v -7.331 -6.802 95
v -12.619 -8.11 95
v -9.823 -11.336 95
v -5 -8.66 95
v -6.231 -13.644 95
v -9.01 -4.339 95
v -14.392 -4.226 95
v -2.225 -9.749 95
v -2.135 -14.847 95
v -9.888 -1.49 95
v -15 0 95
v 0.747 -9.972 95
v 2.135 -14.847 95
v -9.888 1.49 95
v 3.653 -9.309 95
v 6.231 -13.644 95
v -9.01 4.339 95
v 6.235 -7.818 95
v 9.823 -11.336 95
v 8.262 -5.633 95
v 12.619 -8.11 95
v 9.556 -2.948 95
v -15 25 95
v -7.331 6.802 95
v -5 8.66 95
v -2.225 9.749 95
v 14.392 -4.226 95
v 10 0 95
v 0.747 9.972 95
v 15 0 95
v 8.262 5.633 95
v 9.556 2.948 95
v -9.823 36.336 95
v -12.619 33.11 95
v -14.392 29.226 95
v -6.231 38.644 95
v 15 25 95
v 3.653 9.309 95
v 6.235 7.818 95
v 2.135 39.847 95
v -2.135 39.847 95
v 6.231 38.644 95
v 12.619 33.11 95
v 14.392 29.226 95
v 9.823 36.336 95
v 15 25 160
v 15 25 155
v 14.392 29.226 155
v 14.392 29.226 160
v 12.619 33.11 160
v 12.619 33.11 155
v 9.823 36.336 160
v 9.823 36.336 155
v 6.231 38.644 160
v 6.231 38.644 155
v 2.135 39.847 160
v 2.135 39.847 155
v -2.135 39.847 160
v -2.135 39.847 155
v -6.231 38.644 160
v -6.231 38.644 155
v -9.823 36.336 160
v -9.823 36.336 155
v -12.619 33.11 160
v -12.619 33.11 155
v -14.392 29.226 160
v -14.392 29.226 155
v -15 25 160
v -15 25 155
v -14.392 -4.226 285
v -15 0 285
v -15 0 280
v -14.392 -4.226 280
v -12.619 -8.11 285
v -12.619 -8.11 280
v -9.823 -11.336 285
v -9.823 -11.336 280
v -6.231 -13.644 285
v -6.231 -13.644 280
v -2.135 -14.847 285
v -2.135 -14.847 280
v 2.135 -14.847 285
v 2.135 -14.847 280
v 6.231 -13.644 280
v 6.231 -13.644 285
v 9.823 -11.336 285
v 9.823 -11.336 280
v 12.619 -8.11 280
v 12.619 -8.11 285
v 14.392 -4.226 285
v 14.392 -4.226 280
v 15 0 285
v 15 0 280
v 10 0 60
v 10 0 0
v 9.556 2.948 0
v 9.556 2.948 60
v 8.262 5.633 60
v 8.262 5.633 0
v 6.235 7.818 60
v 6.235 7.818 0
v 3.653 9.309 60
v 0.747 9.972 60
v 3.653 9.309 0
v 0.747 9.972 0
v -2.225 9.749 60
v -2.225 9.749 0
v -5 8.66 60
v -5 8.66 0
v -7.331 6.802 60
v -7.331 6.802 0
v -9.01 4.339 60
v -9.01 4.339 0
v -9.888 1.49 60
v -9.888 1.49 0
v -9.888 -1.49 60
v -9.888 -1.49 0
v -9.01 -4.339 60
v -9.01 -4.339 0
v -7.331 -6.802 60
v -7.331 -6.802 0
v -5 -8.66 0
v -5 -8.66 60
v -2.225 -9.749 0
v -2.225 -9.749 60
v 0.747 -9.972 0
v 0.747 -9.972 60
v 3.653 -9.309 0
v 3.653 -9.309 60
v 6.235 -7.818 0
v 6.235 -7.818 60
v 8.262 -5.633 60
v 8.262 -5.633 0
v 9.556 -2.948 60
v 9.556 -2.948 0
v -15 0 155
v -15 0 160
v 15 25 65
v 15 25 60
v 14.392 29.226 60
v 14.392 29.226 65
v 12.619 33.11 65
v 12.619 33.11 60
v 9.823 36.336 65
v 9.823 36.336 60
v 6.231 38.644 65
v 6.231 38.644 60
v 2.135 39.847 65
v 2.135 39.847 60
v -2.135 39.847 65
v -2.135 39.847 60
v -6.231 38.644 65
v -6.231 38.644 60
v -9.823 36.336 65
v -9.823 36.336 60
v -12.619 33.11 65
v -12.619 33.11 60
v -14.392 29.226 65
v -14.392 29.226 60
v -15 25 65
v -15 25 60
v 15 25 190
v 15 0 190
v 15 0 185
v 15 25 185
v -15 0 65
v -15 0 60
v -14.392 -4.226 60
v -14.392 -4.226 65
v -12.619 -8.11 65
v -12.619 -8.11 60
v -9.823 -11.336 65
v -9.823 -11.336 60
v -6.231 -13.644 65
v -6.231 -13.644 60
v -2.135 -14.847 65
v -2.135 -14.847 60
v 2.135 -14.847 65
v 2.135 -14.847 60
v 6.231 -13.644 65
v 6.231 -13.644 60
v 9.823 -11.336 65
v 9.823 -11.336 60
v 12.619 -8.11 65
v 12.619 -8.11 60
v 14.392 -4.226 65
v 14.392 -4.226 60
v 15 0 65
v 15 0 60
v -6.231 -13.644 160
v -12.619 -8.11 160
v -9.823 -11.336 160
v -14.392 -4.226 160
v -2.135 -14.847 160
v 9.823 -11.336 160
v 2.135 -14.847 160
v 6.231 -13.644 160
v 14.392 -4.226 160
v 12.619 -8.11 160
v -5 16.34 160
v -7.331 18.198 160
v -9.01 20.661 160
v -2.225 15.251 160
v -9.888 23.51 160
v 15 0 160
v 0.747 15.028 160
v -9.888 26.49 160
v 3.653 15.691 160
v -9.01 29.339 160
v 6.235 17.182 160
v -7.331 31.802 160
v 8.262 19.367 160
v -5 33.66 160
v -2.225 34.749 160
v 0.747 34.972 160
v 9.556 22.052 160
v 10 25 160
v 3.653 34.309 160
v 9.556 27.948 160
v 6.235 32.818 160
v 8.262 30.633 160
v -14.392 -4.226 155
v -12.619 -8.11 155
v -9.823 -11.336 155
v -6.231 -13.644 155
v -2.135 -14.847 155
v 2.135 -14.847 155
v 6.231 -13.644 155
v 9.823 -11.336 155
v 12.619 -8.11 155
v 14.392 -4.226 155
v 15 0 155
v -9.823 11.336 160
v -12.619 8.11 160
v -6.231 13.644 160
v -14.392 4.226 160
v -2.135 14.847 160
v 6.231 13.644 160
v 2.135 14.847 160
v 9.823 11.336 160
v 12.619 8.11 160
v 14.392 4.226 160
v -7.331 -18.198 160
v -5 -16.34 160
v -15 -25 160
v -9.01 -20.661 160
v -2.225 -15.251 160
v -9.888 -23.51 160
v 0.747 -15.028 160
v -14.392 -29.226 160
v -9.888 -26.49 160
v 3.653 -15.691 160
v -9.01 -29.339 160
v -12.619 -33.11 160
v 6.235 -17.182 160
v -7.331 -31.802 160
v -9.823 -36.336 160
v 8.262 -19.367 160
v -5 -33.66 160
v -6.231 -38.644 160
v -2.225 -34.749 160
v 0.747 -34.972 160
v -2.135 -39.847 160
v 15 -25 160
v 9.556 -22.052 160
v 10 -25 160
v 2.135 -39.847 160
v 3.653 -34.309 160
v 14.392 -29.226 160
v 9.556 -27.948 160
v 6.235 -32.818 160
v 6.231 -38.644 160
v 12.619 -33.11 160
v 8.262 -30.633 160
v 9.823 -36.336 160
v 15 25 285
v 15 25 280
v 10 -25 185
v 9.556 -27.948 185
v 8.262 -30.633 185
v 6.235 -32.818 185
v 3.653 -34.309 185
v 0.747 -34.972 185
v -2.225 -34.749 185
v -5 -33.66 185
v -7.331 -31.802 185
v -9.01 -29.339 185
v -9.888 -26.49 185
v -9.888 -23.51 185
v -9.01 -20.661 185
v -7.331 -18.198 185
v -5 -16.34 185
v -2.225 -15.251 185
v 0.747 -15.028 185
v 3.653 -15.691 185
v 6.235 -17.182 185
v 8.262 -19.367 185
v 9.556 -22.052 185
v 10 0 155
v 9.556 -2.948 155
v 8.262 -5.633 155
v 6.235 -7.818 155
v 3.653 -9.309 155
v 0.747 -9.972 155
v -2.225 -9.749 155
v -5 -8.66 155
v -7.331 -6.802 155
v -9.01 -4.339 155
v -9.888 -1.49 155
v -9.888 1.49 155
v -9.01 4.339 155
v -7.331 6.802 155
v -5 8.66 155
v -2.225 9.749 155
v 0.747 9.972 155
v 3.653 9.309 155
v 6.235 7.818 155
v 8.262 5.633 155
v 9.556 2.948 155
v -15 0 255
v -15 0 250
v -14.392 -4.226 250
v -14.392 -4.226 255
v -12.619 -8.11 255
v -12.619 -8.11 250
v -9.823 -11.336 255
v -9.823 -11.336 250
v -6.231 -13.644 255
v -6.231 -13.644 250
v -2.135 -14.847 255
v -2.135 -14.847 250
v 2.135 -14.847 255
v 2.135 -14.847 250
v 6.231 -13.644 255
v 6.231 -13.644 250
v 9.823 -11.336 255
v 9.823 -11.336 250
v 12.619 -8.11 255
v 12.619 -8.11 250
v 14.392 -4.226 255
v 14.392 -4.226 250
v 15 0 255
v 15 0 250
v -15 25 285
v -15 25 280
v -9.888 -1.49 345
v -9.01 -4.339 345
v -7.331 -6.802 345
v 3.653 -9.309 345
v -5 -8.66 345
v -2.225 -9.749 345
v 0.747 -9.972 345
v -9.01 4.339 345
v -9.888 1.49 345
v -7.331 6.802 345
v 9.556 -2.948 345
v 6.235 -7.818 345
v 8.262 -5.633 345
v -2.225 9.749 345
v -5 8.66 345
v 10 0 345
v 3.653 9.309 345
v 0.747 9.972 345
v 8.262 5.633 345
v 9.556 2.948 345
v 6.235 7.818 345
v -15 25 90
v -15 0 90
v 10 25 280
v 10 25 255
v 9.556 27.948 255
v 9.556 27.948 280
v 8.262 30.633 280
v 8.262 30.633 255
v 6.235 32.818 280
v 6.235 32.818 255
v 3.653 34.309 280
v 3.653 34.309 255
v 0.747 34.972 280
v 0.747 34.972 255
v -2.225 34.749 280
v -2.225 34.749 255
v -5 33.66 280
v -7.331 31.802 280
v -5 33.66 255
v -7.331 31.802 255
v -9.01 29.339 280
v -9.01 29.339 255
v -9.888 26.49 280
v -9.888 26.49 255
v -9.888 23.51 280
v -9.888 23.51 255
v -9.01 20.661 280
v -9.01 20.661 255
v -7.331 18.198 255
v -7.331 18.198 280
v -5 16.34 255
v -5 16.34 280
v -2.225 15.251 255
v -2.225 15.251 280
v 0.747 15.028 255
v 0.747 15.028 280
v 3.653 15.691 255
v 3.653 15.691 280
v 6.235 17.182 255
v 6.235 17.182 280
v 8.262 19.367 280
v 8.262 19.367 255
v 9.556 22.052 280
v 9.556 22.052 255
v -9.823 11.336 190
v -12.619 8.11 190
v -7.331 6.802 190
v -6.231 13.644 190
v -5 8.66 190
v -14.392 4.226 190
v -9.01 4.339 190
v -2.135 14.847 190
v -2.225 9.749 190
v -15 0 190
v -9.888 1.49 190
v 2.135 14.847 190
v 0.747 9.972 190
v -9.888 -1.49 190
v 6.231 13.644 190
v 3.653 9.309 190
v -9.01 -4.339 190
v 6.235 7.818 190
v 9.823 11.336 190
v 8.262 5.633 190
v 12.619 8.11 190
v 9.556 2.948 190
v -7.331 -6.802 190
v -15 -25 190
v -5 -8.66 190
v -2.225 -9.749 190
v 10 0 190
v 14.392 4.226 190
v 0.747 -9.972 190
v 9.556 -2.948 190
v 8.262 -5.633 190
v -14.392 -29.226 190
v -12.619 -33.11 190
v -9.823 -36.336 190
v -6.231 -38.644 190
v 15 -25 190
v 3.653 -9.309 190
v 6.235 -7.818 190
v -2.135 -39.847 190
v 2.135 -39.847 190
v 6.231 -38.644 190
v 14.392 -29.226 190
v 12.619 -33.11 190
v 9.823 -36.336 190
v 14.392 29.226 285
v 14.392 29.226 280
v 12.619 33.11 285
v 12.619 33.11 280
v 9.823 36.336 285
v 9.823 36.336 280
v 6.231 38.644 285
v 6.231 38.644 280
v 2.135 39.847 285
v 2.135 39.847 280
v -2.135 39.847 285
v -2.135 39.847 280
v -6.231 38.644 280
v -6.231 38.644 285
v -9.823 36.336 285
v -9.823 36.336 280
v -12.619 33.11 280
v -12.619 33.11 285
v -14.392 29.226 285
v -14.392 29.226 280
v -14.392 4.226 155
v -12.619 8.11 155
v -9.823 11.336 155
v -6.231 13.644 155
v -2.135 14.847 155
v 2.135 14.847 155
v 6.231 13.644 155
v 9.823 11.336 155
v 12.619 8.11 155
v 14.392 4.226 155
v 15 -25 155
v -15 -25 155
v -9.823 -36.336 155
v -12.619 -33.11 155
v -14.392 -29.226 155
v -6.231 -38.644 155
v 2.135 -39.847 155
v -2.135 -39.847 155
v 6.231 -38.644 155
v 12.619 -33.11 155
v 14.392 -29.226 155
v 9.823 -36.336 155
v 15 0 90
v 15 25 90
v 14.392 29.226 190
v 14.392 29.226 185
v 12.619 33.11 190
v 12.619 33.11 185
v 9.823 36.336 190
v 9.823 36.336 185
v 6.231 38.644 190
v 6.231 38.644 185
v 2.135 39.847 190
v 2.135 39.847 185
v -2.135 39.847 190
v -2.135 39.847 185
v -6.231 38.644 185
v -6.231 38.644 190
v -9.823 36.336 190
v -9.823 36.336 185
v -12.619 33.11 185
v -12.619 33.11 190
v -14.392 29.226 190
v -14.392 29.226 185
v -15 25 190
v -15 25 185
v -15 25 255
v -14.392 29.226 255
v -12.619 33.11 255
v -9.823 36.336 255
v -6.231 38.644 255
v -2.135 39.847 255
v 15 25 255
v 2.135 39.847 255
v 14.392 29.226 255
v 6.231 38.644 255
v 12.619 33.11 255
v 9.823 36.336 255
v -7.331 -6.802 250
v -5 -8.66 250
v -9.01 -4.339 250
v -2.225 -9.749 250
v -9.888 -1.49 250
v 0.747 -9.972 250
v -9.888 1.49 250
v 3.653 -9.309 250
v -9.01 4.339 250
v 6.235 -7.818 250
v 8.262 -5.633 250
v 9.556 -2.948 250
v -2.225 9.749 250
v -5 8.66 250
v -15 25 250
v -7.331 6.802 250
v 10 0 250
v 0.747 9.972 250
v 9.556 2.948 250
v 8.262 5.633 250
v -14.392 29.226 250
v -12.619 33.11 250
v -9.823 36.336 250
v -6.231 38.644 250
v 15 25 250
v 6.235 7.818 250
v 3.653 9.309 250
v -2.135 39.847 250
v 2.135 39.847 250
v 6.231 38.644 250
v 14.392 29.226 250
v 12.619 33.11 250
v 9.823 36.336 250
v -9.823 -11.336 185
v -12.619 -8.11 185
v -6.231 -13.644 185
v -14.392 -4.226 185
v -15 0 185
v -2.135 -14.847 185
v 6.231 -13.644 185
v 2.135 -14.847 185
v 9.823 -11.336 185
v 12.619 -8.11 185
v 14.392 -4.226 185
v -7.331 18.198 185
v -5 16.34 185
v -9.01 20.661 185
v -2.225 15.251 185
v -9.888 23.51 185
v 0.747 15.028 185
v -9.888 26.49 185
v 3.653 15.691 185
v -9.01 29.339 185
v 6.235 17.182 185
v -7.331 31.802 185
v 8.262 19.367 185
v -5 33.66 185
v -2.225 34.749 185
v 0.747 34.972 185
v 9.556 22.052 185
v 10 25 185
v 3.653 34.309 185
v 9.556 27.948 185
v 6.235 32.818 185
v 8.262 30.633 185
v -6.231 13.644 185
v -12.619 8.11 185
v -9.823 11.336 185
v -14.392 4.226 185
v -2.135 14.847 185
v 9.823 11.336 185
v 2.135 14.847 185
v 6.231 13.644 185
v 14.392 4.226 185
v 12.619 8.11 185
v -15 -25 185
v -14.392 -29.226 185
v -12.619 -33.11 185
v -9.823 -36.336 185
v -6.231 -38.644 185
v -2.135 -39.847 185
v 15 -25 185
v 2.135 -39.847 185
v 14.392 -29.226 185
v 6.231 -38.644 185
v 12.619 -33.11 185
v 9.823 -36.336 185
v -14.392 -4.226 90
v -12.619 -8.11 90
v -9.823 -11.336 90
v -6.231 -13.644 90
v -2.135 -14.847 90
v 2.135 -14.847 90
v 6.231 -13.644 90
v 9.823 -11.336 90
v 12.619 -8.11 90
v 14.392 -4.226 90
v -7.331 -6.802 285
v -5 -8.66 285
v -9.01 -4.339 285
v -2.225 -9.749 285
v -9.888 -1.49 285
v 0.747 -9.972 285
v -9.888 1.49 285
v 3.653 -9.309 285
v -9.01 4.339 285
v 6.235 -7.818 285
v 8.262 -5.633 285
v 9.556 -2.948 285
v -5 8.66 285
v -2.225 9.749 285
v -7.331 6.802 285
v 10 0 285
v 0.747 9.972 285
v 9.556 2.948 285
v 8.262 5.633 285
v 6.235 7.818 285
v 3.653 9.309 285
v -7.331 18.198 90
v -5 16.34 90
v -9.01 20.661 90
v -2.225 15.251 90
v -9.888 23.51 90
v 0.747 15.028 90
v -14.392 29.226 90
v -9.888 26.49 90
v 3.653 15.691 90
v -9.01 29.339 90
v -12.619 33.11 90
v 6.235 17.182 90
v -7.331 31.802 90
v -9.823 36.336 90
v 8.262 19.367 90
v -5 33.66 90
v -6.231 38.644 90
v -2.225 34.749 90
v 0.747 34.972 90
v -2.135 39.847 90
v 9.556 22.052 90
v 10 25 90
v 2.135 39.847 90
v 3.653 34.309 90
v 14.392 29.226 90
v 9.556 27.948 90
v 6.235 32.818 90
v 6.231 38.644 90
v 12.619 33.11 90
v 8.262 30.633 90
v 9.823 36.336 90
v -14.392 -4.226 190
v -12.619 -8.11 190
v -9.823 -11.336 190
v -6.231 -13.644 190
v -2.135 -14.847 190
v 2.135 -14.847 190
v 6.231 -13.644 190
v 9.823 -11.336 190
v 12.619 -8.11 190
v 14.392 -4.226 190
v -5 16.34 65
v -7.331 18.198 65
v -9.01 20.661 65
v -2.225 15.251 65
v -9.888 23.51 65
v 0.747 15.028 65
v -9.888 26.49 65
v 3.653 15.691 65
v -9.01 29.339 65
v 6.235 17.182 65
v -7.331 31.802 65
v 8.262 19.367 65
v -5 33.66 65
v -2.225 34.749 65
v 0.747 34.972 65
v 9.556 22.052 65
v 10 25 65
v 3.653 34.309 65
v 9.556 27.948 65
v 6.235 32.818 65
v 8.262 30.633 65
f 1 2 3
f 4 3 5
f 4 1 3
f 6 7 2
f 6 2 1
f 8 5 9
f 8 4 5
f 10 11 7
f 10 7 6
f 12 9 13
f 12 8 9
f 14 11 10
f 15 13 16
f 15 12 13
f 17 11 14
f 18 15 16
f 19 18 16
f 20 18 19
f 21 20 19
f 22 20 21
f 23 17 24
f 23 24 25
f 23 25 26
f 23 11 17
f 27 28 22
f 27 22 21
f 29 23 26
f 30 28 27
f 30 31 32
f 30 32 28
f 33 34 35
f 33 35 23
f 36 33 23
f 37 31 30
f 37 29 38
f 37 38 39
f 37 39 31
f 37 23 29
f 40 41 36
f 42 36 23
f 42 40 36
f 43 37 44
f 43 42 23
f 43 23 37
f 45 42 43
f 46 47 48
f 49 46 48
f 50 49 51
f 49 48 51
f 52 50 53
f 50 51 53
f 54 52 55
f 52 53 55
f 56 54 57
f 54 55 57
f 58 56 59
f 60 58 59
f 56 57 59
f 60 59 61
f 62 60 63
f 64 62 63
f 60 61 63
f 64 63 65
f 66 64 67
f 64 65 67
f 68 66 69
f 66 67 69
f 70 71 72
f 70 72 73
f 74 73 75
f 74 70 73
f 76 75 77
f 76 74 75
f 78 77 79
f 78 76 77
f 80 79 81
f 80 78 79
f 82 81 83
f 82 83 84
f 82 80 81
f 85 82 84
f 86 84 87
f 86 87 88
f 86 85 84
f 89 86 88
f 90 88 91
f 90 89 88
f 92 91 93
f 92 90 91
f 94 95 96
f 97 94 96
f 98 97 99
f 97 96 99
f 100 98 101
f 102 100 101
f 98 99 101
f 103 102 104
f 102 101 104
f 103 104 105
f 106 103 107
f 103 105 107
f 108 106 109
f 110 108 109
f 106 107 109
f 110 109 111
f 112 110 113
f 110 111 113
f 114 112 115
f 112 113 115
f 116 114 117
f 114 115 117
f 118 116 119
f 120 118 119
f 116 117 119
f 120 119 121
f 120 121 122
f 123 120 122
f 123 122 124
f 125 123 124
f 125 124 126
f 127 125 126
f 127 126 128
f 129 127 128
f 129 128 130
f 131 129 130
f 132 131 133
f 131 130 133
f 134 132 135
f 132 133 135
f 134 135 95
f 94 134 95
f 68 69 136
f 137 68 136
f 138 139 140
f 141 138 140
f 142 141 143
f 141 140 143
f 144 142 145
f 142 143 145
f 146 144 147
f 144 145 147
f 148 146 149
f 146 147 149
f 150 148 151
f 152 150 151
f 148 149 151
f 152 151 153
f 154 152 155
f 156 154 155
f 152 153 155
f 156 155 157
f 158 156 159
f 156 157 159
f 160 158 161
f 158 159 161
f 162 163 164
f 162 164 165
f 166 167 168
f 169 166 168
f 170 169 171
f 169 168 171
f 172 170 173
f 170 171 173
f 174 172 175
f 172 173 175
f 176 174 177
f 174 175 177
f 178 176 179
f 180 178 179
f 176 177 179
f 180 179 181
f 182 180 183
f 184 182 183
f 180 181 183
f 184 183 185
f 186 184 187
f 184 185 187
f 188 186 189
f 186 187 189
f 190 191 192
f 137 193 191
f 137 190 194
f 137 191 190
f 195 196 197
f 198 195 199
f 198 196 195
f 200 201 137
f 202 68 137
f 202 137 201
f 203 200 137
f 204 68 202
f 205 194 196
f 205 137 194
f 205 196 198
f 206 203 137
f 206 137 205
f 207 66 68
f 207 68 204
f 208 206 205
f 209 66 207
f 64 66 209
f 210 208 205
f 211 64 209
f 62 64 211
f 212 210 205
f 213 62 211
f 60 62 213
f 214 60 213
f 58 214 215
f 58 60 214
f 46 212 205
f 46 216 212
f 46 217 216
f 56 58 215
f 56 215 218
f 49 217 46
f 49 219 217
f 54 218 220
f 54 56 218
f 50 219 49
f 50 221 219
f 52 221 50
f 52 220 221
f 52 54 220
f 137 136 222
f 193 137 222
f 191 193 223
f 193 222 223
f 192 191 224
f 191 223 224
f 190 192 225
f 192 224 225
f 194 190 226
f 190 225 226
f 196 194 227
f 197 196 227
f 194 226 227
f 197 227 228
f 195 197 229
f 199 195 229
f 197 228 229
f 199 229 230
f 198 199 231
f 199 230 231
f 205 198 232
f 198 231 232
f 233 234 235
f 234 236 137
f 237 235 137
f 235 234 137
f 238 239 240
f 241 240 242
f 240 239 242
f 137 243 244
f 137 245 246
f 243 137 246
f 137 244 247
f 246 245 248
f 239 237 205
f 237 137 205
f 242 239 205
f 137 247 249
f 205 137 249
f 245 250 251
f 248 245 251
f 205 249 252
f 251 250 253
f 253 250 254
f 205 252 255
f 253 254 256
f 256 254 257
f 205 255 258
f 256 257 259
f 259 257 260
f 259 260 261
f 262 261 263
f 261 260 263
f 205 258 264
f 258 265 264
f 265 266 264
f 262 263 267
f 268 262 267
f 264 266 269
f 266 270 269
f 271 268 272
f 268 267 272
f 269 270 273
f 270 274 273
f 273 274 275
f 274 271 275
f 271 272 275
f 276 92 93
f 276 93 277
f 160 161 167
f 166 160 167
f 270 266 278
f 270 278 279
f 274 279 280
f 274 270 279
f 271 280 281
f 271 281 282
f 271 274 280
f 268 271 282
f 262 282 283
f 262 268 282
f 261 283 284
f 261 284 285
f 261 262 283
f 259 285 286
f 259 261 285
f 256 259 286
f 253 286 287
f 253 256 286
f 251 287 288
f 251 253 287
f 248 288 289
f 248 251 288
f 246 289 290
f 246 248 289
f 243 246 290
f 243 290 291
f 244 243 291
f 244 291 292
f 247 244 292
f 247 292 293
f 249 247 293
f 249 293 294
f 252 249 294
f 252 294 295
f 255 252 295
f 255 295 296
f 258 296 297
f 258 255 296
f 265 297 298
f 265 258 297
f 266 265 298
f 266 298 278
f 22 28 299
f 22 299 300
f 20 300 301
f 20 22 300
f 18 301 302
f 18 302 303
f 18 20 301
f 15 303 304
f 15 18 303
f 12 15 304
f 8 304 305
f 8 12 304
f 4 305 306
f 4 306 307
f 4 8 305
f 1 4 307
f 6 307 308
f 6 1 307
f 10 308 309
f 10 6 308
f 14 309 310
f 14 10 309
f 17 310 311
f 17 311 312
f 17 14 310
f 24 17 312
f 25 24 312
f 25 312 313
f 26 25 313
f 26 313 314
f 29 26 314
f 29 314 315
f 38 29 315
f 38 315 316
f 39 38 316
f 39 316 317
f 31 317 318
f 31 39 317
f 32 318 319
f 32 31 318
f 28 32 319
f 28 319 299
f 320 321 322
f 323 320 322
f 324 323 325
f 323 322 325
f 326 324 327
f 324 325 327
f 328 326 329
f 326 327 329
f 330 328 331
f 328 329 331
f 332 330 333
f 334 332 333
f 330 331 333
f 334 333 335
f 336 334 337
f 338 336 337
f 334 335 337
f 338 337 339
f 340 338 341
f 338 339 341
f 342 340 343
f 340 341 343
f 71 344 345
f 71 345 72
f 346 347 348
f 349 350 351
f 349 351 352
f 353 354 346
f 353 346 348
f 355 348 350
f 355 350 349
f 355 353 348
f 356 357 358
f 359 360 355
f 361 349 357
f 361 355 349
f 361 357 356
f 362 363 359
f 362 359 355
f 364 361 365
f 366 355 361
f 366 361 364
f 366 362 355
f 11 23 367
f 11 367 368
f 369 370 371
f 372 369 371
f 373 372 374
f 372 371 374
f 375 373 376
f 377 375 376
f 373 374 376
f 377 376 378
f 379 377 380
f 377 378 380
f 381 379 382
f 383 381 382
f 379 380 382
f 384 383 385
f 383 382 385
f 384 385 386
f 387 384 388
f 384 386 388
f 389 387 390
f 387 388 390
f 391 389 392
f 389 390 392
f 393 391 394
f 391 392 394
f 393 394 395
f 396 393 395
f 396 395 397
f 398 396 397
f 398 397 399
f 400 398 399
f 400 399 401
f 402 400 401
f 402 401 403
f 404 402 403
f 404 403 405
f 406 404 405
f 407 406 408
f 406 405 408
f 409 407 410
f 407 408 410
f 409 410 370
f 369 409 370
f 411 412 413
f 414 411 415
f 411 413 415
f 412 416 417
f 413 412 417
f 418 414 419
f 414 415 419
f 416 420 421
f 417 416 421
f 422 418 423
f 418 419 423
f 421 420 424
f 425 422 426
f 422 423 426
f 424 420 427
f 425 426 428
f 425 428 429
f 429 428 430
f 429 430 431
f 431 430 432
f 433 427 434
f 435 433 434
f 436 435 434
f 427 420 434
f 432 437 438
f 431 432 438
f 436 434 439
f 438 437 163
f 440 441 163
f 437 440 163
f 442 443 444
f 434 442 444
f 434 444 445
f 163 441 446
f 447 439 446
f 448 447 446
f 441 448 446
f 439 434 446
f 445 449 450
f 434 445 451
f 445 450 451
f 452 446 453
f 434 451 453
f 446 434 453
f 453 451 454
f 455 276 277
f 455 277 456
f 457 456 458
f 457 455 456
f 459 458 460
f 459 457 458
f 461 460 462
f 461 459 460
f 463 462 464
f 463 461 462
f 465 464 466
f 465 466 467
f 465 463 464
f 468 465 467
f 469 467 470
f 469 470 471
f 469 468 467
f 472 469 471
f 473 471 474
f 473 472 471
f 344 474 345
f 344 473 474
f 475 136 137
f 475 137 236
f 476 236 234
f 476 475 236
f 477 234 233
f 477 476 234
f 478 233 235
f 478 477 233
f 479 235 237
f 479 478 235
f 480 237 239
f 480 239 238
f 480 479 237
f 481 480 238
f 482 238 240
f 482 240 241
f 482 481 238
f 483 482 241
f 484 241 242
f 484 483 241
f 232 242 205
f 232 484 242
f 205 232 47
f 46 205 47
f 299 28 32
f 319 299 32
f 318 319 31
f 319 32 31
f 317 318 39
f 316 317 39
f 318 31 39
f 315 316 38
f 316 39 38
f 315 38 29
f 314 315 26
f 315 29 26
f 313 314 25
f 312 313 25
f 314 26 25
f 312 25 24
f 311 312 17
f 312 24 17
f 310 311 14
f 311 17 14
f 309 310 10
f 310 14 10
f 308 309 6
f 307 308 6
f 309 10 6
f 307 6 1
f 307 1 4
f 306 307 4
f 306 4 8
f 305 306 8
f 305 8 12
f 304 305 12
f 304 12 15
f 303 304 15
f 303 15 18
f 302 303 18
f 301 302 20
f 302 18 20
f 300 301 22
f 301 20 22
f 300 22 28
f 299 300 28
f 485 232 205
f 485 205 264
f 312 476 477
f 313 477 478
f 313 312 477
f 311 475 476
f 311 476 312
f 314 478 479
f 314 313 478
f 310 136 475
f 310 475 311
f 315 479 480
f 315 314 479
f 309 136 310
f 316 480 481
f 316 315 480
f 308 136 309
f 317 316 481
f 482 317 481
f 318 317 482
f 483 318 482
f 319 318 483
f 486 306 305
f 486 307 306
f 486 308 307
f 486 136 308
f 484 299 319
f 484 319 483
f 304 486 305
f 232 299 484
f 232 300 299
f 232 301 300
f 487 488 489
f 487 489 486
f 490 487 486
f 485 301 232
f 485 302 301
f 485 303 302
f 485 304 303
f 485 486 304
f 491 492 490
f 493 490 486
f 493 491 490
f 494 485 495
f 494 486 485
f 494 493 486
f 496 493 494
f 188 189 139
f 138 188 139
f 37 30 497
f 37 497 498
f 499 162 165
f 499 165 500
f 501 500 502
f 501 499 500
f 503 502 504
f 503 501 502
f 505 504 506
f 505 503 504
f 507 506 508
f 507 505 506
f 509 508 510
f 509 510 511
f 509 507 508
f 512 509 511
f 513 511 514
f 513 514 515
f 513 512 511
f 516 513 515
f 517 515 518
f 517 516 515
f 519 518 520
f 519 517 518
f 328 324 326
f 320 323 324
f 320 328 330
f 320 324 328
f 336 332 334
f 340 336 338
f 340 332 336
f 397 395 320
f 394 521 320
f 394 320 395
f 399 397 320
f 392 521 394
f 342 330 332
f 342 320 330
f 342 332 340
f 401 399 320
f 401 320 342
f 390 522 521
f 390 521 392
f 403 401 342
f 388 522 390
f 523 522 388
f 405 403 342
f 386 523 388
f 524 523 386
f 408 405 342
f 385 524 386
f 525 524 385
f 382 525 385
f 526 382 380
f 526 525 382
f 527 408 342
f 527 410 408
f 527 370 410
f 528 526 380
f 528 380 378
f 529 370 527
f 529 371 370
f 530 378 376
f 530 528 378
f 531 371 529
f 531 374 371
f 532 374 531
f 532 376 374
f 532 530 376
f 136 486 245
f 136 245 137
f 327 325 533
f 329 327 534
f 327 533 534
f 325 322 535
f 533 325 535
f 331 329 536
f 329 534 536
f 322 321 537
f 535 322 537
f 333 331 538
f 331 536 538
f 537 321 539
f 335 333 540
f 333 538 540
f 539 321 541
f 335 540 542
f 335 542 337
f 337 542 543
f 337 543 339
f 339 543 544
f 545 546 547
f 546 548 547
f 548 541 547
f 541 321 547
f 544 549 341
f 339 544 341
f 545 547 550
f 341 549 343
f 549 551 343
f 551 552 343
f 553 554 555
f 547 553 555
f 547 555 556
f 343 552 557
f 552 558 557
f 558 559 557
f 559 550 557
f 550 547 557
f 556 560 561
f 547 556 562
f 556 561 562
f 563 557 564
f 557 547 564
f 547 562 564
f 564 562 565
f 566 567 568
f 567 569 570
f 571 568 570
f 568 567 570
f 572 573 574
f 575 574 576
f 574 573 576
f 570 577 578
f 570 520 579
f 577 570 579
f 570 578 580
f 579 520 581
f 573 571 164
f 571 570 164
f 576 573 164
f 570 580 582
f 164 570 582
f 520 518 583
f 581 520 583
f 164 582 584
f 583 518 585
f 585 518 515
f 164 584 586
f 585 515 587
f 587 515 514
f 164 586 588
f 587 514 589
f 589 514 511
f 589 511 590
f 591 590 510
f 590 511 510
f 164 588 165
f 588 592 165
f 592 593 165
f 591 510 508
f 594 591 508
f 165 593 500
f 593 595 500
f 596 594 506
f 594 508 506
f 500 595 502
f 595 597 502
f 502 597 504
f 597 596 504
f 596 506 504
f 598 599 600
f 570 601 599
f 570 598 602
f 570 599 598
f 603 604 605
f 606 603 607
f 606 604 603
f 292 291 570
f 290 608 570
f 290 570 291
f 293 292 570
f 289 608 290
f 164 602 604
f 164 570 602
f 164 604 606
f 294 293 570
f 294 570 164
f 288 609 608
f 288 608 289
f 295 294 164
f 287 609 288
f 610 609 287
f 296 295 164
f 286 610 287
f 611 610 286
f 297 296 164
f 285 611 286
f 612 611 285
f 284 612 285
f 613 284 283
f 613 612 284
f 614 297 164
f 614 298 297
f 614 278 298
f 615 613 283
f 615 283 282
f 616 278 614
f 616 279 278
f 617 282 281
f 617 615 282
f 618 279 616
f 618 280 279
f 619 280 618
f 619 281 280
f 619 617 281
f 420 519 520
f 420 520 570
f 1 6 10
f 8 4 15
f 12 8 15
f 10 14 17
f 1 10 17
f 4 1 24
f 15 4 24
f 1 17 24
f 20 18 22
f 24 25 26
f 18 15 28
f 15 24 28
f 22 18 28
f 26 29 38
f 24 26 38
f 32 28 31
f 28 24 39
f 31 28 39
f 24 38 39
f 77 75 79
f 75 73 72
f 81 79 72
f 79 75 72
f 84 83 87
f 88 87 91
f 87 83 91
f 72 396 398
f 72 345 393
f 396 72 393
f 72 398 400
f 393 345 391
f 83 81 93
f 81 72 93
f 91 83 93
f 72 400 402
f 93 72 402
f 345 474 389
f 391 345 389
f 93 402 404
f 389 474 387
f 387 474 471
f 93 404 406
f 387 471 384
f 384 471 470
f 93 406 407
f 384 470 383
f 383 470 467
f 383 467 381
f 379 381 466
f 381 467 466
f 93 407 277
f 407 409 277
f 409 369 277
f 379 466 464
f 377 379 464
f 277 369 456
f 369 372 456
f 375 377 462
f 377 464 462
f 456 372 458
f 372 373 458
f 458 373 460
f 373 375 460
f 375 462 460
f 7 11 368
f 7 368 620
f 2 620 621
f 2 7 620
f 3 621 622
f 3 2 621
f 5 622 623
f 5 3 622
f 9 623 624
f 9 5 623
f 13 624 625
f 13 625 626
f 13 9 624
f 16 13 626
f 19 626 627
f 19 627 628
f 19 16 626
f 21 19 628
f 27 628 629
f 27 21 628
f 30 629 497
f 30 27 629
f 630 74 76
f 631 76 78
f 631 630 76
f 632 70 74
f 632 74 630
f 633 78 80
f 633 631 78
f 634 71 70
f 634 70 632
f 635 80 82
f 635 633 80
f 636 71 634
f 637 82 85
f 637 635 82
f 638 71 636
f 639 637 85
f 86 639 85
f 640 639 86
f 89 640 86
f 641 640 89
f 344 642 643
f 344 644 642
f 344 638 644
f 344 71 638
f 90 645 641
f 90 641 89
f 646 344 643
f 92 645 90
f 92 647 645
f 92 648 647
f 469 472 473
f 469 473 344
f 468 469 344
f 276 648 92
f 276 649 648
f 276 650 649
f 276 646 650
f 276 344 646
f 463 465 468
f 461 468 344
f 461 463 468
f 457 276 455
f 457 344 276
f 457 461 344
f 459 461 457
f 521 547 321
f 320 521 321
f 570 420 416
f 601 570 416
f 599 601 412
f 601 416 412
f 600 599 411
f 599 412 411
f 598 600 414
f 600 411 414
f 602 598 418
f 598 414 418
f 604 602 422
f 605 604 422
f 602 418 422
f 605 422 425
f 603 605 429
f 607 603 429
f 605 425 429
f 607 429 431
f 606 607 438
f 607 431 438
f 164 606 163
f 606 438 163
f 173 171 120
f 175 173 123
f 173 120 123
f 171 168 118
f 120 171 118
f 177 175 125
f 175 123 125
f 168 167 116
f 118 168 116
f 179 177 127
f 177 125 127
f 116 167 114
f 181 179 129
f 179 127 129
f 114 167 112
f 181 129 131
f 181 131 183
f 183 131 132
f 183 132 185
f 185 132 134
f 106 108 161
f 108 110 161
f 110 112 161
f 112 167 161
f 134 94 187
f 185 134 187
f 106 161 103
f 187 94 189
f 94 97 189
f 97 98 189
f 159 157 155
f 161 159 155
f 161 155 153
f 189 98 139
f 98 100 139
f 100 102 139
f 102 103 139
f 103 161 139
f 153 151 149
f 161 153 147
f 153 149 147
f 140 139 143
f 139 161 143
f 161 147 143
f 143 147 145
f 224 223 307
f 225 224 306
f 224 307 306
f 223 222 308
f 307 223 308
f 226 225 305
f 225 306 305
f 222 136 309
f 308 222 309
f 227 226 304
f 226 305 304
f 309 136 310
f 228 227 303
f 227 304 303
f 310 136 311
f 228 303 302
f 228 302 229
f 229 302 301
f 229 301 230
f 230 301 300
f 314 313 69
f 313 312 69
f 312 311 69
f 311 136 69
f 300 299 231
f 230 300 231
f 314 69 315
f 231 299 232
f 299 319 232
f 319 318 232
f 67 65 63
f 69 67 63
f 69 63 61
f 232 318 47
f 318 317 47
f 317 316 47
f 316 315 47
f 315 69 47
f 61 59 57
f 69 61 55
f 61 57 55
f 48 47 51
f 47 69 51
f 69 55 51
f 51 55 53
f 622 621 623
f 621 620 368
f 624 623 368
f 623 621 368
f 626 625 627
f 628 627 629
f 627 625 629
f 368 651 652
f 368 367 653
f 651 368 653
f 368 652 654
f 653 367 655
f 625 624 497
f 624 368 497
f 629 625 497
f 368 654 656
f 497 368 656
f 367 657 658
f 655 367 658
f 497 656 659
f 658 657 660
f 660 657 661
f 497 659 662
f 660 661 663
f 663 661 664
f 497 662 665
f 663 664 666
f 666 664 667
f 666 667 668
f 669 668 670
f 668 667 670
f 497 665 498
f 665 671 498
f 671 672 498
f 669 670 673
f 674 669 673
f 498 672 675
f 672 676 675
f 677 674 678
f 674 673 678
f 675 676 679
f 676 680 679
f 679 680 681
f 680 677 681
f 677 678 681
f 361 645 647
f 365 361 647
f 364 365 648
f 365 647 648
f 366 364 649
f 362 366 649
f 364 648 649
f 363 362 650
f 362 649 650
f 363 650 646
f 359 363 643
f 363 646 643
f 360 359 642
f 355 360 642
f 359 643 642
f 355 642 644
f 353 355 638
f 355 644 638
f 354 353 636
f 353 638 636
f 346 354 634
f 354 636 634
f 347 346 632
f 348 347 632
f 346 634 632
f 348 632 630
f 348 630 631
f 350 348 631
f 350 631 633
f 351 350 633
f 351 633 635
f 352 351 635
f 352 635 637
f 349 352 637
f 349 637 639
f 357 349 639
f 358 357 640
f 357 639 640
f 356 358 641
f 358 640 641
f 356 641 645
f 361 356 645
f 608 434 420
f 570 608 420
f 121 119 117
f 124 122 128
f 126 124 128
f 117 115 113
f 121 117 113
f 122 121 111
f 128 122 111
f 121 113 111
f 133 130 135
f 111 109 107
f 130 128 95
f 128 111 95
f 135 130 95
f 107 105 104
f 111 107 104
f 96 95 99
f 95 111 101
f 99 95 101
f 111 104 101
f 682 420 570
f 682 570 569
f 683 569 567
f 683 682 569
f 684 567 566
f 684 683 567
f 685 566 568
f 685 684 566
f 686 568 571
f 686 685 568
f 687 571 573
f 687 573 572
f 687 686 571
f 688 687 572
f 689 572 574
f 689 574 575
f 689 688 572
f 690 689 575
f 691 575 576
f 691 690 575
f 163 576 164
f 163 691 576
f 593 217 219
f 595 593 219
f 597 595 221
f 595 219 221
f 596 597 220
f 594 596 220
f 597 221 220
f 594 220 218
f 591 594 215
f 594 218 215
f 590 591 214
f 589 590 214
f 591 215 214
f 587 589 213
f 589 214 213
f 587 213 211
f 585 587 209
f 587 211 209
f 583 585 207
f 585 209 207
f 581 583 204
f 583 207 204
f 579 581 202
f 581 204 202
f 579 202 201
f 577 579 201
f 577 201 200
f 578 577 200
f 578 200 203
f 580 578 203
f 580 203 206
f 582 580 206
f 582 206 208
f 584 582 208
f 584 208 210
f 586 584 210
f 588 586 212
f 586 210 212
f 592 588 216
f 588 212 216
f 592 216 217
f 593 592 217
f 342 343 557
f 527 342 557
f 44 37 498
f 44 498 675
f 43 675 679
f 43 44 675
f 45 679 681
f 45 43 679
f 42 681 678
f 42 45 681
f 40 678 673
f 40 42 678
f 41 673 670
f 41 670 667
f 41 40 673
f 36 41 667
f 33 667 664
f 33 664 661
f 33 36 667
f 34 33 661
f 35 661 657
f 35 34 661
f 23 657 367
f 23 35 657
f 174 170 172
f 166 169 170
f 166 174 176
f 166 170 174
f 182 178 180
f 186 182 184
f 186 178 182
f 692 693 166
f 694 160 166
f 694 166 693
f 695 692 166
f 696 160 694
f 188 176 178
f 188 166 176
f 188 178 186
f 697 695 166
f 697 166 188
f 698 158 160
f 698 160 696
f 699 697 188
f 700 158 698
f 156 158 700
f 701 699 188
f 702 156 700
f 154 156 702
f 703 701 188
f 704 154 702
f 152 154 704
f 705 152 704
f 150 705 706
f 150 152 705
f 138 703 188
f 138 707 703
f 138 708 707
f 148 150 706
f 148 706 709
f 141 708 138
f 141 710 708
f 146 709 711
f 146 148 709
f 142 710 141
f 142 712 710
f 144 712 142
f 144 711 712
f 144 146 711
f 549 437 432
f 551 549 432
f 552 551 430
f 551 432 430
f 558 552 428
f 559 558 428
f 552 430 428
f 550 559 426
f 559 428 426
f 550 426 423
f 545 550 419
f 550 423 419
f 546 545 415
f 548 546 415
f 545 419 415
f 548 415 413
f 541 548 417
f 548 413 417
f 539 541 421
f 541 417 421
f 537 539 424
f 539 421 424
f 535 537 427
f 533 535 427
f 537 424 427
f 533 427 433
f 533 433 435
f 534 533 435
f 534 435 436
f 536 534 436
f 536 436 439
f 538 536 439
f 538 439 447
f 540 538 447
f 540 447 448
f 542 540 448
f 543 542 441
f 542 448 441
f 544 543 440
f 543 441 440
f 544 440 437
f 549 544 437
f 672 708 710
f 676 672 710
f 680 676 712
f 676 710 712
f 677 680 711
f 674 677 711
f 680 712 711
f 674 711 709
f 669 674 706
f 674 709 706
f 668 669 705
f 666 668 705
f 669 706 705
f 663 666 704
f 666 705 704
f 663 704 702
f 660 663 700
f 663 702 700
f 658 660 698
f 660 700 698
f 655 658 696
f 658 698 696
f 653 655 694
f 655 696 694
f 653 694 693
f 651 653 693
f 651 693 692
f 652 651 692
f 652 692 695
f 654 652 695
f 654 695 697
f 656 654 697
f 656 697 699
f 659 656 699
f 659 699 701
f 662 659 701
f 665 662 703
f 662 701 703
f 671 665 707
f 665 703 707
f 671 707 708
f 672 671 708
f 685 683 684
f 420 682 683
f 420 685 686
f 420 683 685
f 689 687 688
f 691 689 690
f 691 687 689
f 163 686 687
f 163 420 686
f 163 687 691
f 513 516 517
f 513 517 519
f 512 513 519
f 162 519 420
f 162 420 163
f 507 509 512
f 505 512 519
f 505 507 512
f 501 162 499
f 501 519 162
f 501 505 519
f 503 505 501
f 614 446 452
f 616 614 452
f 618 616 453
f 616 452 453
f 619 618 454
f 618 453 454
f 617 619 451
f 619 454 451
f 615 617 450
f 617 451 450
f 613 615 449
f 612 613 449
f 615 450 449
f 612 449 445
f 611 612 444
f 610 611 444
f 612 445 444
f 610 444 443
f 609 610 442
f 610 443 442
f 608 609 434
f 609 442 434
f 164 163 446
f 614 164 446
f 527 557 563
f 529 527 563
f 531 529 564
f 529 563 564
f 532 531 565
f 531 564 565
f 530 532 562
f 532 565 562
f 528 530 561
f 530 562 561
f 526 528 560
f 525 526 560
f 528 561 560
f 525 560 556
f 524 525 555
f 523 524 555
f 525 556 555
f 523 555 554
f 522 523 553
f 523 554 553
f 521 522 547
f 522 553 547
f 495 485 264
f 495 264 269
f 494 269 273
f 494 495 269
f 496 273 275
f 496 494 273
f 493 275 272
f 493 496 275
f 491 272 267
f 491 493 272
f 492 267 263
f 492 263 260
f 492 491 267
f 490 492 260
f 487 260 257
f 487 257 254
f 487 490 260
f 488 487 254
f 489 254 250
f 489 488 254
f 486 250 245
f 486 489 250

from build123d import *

# Parameters (mm, degrees)
SKETCH1_R           = 10
BOSS_EXTRUDE1_DEPTH = 60
BOSS_EXTRUDE2_DEPTH = 5
SKETCH4_R           = 10
BOSS_EXTRUDE3_DEPTH = 25
LPATTERN2_COUNT     = 3
LPATTERN2_PITCH     = 95
SKETCH7_R           = 10
BOSS_EXTRUDE5_DEPTH = 60


with BuildPart() as part:
    # Sketch1 → Boss-Extrude1 (new body)
    with BuildSketch(Plane.XY):
        Circle(SKETCH1_R)
    extrude(amount=BOSS_EXTRUDE1_DEPTH)

    # Sketch2 → Boss-Extrude2 (add)
    with BuildSketch(Plane.XY.offset(60)):
        with BuildLine():
            Line((-15, 25), (-15, 0))
            ThreePointArc((-15, 0), (0, -15), (15, 0))
            Line((15, 0), (15, 25))
            ThreePointArc((15, 25), (0, 40), (-15, 25))
        make_face()
    boss_extrude2 = extrude(amount=BOSS_EXTRUDE2_DEPTH)

    # Sketch4 → Boss-Extrude3 (add)
    with BuildSketch(Plane.XY.offset(65)):
        with Locations((0, 25)):
            Circle(SKETCH4_R)
    extrude(amount=BOSS_EXTRUDE3_DEPTH)

    # Mirror1: Boss-Extrude2 across plane
    add(boss_extrude2.mirror(Plane.XY.offset(77.5)))


with BuildPart() as lpattern2_1:
    # LPattern2: pattern copy
    add(part.part.moved(Location(Vector(0, 0, 1) * (1 * LPATTERN2_PITCH))))


with BuildPart() as lpattern2_2:
    # LPattern2: pattern copy
    add(part.part.moved(Location(Vector(0, 0, 1) * (2 * LPATTERN2_PITCH))))

    # Sketch7 → Boss-Extrude5 (add)
    with BuildSketch(Plane.XY.offset(285)):
        Circle(SKETCH7_R)
    extrude(amount=BOSS_EXTRUDE5_DEPTH)


with BuildPart() as body_4:
    # Mirror2: mirrored copy
    add(lpattern2_1.part.mirror(Plane.ZX))


with BuildPart() as part_1:
    add(part.part)

    # Combine1: union LPattern2_2, body 4
    add(lpattern2_2.part)
    add(body_4.part)


solid = Compound([lpattern2_1.part, part_1.part])
